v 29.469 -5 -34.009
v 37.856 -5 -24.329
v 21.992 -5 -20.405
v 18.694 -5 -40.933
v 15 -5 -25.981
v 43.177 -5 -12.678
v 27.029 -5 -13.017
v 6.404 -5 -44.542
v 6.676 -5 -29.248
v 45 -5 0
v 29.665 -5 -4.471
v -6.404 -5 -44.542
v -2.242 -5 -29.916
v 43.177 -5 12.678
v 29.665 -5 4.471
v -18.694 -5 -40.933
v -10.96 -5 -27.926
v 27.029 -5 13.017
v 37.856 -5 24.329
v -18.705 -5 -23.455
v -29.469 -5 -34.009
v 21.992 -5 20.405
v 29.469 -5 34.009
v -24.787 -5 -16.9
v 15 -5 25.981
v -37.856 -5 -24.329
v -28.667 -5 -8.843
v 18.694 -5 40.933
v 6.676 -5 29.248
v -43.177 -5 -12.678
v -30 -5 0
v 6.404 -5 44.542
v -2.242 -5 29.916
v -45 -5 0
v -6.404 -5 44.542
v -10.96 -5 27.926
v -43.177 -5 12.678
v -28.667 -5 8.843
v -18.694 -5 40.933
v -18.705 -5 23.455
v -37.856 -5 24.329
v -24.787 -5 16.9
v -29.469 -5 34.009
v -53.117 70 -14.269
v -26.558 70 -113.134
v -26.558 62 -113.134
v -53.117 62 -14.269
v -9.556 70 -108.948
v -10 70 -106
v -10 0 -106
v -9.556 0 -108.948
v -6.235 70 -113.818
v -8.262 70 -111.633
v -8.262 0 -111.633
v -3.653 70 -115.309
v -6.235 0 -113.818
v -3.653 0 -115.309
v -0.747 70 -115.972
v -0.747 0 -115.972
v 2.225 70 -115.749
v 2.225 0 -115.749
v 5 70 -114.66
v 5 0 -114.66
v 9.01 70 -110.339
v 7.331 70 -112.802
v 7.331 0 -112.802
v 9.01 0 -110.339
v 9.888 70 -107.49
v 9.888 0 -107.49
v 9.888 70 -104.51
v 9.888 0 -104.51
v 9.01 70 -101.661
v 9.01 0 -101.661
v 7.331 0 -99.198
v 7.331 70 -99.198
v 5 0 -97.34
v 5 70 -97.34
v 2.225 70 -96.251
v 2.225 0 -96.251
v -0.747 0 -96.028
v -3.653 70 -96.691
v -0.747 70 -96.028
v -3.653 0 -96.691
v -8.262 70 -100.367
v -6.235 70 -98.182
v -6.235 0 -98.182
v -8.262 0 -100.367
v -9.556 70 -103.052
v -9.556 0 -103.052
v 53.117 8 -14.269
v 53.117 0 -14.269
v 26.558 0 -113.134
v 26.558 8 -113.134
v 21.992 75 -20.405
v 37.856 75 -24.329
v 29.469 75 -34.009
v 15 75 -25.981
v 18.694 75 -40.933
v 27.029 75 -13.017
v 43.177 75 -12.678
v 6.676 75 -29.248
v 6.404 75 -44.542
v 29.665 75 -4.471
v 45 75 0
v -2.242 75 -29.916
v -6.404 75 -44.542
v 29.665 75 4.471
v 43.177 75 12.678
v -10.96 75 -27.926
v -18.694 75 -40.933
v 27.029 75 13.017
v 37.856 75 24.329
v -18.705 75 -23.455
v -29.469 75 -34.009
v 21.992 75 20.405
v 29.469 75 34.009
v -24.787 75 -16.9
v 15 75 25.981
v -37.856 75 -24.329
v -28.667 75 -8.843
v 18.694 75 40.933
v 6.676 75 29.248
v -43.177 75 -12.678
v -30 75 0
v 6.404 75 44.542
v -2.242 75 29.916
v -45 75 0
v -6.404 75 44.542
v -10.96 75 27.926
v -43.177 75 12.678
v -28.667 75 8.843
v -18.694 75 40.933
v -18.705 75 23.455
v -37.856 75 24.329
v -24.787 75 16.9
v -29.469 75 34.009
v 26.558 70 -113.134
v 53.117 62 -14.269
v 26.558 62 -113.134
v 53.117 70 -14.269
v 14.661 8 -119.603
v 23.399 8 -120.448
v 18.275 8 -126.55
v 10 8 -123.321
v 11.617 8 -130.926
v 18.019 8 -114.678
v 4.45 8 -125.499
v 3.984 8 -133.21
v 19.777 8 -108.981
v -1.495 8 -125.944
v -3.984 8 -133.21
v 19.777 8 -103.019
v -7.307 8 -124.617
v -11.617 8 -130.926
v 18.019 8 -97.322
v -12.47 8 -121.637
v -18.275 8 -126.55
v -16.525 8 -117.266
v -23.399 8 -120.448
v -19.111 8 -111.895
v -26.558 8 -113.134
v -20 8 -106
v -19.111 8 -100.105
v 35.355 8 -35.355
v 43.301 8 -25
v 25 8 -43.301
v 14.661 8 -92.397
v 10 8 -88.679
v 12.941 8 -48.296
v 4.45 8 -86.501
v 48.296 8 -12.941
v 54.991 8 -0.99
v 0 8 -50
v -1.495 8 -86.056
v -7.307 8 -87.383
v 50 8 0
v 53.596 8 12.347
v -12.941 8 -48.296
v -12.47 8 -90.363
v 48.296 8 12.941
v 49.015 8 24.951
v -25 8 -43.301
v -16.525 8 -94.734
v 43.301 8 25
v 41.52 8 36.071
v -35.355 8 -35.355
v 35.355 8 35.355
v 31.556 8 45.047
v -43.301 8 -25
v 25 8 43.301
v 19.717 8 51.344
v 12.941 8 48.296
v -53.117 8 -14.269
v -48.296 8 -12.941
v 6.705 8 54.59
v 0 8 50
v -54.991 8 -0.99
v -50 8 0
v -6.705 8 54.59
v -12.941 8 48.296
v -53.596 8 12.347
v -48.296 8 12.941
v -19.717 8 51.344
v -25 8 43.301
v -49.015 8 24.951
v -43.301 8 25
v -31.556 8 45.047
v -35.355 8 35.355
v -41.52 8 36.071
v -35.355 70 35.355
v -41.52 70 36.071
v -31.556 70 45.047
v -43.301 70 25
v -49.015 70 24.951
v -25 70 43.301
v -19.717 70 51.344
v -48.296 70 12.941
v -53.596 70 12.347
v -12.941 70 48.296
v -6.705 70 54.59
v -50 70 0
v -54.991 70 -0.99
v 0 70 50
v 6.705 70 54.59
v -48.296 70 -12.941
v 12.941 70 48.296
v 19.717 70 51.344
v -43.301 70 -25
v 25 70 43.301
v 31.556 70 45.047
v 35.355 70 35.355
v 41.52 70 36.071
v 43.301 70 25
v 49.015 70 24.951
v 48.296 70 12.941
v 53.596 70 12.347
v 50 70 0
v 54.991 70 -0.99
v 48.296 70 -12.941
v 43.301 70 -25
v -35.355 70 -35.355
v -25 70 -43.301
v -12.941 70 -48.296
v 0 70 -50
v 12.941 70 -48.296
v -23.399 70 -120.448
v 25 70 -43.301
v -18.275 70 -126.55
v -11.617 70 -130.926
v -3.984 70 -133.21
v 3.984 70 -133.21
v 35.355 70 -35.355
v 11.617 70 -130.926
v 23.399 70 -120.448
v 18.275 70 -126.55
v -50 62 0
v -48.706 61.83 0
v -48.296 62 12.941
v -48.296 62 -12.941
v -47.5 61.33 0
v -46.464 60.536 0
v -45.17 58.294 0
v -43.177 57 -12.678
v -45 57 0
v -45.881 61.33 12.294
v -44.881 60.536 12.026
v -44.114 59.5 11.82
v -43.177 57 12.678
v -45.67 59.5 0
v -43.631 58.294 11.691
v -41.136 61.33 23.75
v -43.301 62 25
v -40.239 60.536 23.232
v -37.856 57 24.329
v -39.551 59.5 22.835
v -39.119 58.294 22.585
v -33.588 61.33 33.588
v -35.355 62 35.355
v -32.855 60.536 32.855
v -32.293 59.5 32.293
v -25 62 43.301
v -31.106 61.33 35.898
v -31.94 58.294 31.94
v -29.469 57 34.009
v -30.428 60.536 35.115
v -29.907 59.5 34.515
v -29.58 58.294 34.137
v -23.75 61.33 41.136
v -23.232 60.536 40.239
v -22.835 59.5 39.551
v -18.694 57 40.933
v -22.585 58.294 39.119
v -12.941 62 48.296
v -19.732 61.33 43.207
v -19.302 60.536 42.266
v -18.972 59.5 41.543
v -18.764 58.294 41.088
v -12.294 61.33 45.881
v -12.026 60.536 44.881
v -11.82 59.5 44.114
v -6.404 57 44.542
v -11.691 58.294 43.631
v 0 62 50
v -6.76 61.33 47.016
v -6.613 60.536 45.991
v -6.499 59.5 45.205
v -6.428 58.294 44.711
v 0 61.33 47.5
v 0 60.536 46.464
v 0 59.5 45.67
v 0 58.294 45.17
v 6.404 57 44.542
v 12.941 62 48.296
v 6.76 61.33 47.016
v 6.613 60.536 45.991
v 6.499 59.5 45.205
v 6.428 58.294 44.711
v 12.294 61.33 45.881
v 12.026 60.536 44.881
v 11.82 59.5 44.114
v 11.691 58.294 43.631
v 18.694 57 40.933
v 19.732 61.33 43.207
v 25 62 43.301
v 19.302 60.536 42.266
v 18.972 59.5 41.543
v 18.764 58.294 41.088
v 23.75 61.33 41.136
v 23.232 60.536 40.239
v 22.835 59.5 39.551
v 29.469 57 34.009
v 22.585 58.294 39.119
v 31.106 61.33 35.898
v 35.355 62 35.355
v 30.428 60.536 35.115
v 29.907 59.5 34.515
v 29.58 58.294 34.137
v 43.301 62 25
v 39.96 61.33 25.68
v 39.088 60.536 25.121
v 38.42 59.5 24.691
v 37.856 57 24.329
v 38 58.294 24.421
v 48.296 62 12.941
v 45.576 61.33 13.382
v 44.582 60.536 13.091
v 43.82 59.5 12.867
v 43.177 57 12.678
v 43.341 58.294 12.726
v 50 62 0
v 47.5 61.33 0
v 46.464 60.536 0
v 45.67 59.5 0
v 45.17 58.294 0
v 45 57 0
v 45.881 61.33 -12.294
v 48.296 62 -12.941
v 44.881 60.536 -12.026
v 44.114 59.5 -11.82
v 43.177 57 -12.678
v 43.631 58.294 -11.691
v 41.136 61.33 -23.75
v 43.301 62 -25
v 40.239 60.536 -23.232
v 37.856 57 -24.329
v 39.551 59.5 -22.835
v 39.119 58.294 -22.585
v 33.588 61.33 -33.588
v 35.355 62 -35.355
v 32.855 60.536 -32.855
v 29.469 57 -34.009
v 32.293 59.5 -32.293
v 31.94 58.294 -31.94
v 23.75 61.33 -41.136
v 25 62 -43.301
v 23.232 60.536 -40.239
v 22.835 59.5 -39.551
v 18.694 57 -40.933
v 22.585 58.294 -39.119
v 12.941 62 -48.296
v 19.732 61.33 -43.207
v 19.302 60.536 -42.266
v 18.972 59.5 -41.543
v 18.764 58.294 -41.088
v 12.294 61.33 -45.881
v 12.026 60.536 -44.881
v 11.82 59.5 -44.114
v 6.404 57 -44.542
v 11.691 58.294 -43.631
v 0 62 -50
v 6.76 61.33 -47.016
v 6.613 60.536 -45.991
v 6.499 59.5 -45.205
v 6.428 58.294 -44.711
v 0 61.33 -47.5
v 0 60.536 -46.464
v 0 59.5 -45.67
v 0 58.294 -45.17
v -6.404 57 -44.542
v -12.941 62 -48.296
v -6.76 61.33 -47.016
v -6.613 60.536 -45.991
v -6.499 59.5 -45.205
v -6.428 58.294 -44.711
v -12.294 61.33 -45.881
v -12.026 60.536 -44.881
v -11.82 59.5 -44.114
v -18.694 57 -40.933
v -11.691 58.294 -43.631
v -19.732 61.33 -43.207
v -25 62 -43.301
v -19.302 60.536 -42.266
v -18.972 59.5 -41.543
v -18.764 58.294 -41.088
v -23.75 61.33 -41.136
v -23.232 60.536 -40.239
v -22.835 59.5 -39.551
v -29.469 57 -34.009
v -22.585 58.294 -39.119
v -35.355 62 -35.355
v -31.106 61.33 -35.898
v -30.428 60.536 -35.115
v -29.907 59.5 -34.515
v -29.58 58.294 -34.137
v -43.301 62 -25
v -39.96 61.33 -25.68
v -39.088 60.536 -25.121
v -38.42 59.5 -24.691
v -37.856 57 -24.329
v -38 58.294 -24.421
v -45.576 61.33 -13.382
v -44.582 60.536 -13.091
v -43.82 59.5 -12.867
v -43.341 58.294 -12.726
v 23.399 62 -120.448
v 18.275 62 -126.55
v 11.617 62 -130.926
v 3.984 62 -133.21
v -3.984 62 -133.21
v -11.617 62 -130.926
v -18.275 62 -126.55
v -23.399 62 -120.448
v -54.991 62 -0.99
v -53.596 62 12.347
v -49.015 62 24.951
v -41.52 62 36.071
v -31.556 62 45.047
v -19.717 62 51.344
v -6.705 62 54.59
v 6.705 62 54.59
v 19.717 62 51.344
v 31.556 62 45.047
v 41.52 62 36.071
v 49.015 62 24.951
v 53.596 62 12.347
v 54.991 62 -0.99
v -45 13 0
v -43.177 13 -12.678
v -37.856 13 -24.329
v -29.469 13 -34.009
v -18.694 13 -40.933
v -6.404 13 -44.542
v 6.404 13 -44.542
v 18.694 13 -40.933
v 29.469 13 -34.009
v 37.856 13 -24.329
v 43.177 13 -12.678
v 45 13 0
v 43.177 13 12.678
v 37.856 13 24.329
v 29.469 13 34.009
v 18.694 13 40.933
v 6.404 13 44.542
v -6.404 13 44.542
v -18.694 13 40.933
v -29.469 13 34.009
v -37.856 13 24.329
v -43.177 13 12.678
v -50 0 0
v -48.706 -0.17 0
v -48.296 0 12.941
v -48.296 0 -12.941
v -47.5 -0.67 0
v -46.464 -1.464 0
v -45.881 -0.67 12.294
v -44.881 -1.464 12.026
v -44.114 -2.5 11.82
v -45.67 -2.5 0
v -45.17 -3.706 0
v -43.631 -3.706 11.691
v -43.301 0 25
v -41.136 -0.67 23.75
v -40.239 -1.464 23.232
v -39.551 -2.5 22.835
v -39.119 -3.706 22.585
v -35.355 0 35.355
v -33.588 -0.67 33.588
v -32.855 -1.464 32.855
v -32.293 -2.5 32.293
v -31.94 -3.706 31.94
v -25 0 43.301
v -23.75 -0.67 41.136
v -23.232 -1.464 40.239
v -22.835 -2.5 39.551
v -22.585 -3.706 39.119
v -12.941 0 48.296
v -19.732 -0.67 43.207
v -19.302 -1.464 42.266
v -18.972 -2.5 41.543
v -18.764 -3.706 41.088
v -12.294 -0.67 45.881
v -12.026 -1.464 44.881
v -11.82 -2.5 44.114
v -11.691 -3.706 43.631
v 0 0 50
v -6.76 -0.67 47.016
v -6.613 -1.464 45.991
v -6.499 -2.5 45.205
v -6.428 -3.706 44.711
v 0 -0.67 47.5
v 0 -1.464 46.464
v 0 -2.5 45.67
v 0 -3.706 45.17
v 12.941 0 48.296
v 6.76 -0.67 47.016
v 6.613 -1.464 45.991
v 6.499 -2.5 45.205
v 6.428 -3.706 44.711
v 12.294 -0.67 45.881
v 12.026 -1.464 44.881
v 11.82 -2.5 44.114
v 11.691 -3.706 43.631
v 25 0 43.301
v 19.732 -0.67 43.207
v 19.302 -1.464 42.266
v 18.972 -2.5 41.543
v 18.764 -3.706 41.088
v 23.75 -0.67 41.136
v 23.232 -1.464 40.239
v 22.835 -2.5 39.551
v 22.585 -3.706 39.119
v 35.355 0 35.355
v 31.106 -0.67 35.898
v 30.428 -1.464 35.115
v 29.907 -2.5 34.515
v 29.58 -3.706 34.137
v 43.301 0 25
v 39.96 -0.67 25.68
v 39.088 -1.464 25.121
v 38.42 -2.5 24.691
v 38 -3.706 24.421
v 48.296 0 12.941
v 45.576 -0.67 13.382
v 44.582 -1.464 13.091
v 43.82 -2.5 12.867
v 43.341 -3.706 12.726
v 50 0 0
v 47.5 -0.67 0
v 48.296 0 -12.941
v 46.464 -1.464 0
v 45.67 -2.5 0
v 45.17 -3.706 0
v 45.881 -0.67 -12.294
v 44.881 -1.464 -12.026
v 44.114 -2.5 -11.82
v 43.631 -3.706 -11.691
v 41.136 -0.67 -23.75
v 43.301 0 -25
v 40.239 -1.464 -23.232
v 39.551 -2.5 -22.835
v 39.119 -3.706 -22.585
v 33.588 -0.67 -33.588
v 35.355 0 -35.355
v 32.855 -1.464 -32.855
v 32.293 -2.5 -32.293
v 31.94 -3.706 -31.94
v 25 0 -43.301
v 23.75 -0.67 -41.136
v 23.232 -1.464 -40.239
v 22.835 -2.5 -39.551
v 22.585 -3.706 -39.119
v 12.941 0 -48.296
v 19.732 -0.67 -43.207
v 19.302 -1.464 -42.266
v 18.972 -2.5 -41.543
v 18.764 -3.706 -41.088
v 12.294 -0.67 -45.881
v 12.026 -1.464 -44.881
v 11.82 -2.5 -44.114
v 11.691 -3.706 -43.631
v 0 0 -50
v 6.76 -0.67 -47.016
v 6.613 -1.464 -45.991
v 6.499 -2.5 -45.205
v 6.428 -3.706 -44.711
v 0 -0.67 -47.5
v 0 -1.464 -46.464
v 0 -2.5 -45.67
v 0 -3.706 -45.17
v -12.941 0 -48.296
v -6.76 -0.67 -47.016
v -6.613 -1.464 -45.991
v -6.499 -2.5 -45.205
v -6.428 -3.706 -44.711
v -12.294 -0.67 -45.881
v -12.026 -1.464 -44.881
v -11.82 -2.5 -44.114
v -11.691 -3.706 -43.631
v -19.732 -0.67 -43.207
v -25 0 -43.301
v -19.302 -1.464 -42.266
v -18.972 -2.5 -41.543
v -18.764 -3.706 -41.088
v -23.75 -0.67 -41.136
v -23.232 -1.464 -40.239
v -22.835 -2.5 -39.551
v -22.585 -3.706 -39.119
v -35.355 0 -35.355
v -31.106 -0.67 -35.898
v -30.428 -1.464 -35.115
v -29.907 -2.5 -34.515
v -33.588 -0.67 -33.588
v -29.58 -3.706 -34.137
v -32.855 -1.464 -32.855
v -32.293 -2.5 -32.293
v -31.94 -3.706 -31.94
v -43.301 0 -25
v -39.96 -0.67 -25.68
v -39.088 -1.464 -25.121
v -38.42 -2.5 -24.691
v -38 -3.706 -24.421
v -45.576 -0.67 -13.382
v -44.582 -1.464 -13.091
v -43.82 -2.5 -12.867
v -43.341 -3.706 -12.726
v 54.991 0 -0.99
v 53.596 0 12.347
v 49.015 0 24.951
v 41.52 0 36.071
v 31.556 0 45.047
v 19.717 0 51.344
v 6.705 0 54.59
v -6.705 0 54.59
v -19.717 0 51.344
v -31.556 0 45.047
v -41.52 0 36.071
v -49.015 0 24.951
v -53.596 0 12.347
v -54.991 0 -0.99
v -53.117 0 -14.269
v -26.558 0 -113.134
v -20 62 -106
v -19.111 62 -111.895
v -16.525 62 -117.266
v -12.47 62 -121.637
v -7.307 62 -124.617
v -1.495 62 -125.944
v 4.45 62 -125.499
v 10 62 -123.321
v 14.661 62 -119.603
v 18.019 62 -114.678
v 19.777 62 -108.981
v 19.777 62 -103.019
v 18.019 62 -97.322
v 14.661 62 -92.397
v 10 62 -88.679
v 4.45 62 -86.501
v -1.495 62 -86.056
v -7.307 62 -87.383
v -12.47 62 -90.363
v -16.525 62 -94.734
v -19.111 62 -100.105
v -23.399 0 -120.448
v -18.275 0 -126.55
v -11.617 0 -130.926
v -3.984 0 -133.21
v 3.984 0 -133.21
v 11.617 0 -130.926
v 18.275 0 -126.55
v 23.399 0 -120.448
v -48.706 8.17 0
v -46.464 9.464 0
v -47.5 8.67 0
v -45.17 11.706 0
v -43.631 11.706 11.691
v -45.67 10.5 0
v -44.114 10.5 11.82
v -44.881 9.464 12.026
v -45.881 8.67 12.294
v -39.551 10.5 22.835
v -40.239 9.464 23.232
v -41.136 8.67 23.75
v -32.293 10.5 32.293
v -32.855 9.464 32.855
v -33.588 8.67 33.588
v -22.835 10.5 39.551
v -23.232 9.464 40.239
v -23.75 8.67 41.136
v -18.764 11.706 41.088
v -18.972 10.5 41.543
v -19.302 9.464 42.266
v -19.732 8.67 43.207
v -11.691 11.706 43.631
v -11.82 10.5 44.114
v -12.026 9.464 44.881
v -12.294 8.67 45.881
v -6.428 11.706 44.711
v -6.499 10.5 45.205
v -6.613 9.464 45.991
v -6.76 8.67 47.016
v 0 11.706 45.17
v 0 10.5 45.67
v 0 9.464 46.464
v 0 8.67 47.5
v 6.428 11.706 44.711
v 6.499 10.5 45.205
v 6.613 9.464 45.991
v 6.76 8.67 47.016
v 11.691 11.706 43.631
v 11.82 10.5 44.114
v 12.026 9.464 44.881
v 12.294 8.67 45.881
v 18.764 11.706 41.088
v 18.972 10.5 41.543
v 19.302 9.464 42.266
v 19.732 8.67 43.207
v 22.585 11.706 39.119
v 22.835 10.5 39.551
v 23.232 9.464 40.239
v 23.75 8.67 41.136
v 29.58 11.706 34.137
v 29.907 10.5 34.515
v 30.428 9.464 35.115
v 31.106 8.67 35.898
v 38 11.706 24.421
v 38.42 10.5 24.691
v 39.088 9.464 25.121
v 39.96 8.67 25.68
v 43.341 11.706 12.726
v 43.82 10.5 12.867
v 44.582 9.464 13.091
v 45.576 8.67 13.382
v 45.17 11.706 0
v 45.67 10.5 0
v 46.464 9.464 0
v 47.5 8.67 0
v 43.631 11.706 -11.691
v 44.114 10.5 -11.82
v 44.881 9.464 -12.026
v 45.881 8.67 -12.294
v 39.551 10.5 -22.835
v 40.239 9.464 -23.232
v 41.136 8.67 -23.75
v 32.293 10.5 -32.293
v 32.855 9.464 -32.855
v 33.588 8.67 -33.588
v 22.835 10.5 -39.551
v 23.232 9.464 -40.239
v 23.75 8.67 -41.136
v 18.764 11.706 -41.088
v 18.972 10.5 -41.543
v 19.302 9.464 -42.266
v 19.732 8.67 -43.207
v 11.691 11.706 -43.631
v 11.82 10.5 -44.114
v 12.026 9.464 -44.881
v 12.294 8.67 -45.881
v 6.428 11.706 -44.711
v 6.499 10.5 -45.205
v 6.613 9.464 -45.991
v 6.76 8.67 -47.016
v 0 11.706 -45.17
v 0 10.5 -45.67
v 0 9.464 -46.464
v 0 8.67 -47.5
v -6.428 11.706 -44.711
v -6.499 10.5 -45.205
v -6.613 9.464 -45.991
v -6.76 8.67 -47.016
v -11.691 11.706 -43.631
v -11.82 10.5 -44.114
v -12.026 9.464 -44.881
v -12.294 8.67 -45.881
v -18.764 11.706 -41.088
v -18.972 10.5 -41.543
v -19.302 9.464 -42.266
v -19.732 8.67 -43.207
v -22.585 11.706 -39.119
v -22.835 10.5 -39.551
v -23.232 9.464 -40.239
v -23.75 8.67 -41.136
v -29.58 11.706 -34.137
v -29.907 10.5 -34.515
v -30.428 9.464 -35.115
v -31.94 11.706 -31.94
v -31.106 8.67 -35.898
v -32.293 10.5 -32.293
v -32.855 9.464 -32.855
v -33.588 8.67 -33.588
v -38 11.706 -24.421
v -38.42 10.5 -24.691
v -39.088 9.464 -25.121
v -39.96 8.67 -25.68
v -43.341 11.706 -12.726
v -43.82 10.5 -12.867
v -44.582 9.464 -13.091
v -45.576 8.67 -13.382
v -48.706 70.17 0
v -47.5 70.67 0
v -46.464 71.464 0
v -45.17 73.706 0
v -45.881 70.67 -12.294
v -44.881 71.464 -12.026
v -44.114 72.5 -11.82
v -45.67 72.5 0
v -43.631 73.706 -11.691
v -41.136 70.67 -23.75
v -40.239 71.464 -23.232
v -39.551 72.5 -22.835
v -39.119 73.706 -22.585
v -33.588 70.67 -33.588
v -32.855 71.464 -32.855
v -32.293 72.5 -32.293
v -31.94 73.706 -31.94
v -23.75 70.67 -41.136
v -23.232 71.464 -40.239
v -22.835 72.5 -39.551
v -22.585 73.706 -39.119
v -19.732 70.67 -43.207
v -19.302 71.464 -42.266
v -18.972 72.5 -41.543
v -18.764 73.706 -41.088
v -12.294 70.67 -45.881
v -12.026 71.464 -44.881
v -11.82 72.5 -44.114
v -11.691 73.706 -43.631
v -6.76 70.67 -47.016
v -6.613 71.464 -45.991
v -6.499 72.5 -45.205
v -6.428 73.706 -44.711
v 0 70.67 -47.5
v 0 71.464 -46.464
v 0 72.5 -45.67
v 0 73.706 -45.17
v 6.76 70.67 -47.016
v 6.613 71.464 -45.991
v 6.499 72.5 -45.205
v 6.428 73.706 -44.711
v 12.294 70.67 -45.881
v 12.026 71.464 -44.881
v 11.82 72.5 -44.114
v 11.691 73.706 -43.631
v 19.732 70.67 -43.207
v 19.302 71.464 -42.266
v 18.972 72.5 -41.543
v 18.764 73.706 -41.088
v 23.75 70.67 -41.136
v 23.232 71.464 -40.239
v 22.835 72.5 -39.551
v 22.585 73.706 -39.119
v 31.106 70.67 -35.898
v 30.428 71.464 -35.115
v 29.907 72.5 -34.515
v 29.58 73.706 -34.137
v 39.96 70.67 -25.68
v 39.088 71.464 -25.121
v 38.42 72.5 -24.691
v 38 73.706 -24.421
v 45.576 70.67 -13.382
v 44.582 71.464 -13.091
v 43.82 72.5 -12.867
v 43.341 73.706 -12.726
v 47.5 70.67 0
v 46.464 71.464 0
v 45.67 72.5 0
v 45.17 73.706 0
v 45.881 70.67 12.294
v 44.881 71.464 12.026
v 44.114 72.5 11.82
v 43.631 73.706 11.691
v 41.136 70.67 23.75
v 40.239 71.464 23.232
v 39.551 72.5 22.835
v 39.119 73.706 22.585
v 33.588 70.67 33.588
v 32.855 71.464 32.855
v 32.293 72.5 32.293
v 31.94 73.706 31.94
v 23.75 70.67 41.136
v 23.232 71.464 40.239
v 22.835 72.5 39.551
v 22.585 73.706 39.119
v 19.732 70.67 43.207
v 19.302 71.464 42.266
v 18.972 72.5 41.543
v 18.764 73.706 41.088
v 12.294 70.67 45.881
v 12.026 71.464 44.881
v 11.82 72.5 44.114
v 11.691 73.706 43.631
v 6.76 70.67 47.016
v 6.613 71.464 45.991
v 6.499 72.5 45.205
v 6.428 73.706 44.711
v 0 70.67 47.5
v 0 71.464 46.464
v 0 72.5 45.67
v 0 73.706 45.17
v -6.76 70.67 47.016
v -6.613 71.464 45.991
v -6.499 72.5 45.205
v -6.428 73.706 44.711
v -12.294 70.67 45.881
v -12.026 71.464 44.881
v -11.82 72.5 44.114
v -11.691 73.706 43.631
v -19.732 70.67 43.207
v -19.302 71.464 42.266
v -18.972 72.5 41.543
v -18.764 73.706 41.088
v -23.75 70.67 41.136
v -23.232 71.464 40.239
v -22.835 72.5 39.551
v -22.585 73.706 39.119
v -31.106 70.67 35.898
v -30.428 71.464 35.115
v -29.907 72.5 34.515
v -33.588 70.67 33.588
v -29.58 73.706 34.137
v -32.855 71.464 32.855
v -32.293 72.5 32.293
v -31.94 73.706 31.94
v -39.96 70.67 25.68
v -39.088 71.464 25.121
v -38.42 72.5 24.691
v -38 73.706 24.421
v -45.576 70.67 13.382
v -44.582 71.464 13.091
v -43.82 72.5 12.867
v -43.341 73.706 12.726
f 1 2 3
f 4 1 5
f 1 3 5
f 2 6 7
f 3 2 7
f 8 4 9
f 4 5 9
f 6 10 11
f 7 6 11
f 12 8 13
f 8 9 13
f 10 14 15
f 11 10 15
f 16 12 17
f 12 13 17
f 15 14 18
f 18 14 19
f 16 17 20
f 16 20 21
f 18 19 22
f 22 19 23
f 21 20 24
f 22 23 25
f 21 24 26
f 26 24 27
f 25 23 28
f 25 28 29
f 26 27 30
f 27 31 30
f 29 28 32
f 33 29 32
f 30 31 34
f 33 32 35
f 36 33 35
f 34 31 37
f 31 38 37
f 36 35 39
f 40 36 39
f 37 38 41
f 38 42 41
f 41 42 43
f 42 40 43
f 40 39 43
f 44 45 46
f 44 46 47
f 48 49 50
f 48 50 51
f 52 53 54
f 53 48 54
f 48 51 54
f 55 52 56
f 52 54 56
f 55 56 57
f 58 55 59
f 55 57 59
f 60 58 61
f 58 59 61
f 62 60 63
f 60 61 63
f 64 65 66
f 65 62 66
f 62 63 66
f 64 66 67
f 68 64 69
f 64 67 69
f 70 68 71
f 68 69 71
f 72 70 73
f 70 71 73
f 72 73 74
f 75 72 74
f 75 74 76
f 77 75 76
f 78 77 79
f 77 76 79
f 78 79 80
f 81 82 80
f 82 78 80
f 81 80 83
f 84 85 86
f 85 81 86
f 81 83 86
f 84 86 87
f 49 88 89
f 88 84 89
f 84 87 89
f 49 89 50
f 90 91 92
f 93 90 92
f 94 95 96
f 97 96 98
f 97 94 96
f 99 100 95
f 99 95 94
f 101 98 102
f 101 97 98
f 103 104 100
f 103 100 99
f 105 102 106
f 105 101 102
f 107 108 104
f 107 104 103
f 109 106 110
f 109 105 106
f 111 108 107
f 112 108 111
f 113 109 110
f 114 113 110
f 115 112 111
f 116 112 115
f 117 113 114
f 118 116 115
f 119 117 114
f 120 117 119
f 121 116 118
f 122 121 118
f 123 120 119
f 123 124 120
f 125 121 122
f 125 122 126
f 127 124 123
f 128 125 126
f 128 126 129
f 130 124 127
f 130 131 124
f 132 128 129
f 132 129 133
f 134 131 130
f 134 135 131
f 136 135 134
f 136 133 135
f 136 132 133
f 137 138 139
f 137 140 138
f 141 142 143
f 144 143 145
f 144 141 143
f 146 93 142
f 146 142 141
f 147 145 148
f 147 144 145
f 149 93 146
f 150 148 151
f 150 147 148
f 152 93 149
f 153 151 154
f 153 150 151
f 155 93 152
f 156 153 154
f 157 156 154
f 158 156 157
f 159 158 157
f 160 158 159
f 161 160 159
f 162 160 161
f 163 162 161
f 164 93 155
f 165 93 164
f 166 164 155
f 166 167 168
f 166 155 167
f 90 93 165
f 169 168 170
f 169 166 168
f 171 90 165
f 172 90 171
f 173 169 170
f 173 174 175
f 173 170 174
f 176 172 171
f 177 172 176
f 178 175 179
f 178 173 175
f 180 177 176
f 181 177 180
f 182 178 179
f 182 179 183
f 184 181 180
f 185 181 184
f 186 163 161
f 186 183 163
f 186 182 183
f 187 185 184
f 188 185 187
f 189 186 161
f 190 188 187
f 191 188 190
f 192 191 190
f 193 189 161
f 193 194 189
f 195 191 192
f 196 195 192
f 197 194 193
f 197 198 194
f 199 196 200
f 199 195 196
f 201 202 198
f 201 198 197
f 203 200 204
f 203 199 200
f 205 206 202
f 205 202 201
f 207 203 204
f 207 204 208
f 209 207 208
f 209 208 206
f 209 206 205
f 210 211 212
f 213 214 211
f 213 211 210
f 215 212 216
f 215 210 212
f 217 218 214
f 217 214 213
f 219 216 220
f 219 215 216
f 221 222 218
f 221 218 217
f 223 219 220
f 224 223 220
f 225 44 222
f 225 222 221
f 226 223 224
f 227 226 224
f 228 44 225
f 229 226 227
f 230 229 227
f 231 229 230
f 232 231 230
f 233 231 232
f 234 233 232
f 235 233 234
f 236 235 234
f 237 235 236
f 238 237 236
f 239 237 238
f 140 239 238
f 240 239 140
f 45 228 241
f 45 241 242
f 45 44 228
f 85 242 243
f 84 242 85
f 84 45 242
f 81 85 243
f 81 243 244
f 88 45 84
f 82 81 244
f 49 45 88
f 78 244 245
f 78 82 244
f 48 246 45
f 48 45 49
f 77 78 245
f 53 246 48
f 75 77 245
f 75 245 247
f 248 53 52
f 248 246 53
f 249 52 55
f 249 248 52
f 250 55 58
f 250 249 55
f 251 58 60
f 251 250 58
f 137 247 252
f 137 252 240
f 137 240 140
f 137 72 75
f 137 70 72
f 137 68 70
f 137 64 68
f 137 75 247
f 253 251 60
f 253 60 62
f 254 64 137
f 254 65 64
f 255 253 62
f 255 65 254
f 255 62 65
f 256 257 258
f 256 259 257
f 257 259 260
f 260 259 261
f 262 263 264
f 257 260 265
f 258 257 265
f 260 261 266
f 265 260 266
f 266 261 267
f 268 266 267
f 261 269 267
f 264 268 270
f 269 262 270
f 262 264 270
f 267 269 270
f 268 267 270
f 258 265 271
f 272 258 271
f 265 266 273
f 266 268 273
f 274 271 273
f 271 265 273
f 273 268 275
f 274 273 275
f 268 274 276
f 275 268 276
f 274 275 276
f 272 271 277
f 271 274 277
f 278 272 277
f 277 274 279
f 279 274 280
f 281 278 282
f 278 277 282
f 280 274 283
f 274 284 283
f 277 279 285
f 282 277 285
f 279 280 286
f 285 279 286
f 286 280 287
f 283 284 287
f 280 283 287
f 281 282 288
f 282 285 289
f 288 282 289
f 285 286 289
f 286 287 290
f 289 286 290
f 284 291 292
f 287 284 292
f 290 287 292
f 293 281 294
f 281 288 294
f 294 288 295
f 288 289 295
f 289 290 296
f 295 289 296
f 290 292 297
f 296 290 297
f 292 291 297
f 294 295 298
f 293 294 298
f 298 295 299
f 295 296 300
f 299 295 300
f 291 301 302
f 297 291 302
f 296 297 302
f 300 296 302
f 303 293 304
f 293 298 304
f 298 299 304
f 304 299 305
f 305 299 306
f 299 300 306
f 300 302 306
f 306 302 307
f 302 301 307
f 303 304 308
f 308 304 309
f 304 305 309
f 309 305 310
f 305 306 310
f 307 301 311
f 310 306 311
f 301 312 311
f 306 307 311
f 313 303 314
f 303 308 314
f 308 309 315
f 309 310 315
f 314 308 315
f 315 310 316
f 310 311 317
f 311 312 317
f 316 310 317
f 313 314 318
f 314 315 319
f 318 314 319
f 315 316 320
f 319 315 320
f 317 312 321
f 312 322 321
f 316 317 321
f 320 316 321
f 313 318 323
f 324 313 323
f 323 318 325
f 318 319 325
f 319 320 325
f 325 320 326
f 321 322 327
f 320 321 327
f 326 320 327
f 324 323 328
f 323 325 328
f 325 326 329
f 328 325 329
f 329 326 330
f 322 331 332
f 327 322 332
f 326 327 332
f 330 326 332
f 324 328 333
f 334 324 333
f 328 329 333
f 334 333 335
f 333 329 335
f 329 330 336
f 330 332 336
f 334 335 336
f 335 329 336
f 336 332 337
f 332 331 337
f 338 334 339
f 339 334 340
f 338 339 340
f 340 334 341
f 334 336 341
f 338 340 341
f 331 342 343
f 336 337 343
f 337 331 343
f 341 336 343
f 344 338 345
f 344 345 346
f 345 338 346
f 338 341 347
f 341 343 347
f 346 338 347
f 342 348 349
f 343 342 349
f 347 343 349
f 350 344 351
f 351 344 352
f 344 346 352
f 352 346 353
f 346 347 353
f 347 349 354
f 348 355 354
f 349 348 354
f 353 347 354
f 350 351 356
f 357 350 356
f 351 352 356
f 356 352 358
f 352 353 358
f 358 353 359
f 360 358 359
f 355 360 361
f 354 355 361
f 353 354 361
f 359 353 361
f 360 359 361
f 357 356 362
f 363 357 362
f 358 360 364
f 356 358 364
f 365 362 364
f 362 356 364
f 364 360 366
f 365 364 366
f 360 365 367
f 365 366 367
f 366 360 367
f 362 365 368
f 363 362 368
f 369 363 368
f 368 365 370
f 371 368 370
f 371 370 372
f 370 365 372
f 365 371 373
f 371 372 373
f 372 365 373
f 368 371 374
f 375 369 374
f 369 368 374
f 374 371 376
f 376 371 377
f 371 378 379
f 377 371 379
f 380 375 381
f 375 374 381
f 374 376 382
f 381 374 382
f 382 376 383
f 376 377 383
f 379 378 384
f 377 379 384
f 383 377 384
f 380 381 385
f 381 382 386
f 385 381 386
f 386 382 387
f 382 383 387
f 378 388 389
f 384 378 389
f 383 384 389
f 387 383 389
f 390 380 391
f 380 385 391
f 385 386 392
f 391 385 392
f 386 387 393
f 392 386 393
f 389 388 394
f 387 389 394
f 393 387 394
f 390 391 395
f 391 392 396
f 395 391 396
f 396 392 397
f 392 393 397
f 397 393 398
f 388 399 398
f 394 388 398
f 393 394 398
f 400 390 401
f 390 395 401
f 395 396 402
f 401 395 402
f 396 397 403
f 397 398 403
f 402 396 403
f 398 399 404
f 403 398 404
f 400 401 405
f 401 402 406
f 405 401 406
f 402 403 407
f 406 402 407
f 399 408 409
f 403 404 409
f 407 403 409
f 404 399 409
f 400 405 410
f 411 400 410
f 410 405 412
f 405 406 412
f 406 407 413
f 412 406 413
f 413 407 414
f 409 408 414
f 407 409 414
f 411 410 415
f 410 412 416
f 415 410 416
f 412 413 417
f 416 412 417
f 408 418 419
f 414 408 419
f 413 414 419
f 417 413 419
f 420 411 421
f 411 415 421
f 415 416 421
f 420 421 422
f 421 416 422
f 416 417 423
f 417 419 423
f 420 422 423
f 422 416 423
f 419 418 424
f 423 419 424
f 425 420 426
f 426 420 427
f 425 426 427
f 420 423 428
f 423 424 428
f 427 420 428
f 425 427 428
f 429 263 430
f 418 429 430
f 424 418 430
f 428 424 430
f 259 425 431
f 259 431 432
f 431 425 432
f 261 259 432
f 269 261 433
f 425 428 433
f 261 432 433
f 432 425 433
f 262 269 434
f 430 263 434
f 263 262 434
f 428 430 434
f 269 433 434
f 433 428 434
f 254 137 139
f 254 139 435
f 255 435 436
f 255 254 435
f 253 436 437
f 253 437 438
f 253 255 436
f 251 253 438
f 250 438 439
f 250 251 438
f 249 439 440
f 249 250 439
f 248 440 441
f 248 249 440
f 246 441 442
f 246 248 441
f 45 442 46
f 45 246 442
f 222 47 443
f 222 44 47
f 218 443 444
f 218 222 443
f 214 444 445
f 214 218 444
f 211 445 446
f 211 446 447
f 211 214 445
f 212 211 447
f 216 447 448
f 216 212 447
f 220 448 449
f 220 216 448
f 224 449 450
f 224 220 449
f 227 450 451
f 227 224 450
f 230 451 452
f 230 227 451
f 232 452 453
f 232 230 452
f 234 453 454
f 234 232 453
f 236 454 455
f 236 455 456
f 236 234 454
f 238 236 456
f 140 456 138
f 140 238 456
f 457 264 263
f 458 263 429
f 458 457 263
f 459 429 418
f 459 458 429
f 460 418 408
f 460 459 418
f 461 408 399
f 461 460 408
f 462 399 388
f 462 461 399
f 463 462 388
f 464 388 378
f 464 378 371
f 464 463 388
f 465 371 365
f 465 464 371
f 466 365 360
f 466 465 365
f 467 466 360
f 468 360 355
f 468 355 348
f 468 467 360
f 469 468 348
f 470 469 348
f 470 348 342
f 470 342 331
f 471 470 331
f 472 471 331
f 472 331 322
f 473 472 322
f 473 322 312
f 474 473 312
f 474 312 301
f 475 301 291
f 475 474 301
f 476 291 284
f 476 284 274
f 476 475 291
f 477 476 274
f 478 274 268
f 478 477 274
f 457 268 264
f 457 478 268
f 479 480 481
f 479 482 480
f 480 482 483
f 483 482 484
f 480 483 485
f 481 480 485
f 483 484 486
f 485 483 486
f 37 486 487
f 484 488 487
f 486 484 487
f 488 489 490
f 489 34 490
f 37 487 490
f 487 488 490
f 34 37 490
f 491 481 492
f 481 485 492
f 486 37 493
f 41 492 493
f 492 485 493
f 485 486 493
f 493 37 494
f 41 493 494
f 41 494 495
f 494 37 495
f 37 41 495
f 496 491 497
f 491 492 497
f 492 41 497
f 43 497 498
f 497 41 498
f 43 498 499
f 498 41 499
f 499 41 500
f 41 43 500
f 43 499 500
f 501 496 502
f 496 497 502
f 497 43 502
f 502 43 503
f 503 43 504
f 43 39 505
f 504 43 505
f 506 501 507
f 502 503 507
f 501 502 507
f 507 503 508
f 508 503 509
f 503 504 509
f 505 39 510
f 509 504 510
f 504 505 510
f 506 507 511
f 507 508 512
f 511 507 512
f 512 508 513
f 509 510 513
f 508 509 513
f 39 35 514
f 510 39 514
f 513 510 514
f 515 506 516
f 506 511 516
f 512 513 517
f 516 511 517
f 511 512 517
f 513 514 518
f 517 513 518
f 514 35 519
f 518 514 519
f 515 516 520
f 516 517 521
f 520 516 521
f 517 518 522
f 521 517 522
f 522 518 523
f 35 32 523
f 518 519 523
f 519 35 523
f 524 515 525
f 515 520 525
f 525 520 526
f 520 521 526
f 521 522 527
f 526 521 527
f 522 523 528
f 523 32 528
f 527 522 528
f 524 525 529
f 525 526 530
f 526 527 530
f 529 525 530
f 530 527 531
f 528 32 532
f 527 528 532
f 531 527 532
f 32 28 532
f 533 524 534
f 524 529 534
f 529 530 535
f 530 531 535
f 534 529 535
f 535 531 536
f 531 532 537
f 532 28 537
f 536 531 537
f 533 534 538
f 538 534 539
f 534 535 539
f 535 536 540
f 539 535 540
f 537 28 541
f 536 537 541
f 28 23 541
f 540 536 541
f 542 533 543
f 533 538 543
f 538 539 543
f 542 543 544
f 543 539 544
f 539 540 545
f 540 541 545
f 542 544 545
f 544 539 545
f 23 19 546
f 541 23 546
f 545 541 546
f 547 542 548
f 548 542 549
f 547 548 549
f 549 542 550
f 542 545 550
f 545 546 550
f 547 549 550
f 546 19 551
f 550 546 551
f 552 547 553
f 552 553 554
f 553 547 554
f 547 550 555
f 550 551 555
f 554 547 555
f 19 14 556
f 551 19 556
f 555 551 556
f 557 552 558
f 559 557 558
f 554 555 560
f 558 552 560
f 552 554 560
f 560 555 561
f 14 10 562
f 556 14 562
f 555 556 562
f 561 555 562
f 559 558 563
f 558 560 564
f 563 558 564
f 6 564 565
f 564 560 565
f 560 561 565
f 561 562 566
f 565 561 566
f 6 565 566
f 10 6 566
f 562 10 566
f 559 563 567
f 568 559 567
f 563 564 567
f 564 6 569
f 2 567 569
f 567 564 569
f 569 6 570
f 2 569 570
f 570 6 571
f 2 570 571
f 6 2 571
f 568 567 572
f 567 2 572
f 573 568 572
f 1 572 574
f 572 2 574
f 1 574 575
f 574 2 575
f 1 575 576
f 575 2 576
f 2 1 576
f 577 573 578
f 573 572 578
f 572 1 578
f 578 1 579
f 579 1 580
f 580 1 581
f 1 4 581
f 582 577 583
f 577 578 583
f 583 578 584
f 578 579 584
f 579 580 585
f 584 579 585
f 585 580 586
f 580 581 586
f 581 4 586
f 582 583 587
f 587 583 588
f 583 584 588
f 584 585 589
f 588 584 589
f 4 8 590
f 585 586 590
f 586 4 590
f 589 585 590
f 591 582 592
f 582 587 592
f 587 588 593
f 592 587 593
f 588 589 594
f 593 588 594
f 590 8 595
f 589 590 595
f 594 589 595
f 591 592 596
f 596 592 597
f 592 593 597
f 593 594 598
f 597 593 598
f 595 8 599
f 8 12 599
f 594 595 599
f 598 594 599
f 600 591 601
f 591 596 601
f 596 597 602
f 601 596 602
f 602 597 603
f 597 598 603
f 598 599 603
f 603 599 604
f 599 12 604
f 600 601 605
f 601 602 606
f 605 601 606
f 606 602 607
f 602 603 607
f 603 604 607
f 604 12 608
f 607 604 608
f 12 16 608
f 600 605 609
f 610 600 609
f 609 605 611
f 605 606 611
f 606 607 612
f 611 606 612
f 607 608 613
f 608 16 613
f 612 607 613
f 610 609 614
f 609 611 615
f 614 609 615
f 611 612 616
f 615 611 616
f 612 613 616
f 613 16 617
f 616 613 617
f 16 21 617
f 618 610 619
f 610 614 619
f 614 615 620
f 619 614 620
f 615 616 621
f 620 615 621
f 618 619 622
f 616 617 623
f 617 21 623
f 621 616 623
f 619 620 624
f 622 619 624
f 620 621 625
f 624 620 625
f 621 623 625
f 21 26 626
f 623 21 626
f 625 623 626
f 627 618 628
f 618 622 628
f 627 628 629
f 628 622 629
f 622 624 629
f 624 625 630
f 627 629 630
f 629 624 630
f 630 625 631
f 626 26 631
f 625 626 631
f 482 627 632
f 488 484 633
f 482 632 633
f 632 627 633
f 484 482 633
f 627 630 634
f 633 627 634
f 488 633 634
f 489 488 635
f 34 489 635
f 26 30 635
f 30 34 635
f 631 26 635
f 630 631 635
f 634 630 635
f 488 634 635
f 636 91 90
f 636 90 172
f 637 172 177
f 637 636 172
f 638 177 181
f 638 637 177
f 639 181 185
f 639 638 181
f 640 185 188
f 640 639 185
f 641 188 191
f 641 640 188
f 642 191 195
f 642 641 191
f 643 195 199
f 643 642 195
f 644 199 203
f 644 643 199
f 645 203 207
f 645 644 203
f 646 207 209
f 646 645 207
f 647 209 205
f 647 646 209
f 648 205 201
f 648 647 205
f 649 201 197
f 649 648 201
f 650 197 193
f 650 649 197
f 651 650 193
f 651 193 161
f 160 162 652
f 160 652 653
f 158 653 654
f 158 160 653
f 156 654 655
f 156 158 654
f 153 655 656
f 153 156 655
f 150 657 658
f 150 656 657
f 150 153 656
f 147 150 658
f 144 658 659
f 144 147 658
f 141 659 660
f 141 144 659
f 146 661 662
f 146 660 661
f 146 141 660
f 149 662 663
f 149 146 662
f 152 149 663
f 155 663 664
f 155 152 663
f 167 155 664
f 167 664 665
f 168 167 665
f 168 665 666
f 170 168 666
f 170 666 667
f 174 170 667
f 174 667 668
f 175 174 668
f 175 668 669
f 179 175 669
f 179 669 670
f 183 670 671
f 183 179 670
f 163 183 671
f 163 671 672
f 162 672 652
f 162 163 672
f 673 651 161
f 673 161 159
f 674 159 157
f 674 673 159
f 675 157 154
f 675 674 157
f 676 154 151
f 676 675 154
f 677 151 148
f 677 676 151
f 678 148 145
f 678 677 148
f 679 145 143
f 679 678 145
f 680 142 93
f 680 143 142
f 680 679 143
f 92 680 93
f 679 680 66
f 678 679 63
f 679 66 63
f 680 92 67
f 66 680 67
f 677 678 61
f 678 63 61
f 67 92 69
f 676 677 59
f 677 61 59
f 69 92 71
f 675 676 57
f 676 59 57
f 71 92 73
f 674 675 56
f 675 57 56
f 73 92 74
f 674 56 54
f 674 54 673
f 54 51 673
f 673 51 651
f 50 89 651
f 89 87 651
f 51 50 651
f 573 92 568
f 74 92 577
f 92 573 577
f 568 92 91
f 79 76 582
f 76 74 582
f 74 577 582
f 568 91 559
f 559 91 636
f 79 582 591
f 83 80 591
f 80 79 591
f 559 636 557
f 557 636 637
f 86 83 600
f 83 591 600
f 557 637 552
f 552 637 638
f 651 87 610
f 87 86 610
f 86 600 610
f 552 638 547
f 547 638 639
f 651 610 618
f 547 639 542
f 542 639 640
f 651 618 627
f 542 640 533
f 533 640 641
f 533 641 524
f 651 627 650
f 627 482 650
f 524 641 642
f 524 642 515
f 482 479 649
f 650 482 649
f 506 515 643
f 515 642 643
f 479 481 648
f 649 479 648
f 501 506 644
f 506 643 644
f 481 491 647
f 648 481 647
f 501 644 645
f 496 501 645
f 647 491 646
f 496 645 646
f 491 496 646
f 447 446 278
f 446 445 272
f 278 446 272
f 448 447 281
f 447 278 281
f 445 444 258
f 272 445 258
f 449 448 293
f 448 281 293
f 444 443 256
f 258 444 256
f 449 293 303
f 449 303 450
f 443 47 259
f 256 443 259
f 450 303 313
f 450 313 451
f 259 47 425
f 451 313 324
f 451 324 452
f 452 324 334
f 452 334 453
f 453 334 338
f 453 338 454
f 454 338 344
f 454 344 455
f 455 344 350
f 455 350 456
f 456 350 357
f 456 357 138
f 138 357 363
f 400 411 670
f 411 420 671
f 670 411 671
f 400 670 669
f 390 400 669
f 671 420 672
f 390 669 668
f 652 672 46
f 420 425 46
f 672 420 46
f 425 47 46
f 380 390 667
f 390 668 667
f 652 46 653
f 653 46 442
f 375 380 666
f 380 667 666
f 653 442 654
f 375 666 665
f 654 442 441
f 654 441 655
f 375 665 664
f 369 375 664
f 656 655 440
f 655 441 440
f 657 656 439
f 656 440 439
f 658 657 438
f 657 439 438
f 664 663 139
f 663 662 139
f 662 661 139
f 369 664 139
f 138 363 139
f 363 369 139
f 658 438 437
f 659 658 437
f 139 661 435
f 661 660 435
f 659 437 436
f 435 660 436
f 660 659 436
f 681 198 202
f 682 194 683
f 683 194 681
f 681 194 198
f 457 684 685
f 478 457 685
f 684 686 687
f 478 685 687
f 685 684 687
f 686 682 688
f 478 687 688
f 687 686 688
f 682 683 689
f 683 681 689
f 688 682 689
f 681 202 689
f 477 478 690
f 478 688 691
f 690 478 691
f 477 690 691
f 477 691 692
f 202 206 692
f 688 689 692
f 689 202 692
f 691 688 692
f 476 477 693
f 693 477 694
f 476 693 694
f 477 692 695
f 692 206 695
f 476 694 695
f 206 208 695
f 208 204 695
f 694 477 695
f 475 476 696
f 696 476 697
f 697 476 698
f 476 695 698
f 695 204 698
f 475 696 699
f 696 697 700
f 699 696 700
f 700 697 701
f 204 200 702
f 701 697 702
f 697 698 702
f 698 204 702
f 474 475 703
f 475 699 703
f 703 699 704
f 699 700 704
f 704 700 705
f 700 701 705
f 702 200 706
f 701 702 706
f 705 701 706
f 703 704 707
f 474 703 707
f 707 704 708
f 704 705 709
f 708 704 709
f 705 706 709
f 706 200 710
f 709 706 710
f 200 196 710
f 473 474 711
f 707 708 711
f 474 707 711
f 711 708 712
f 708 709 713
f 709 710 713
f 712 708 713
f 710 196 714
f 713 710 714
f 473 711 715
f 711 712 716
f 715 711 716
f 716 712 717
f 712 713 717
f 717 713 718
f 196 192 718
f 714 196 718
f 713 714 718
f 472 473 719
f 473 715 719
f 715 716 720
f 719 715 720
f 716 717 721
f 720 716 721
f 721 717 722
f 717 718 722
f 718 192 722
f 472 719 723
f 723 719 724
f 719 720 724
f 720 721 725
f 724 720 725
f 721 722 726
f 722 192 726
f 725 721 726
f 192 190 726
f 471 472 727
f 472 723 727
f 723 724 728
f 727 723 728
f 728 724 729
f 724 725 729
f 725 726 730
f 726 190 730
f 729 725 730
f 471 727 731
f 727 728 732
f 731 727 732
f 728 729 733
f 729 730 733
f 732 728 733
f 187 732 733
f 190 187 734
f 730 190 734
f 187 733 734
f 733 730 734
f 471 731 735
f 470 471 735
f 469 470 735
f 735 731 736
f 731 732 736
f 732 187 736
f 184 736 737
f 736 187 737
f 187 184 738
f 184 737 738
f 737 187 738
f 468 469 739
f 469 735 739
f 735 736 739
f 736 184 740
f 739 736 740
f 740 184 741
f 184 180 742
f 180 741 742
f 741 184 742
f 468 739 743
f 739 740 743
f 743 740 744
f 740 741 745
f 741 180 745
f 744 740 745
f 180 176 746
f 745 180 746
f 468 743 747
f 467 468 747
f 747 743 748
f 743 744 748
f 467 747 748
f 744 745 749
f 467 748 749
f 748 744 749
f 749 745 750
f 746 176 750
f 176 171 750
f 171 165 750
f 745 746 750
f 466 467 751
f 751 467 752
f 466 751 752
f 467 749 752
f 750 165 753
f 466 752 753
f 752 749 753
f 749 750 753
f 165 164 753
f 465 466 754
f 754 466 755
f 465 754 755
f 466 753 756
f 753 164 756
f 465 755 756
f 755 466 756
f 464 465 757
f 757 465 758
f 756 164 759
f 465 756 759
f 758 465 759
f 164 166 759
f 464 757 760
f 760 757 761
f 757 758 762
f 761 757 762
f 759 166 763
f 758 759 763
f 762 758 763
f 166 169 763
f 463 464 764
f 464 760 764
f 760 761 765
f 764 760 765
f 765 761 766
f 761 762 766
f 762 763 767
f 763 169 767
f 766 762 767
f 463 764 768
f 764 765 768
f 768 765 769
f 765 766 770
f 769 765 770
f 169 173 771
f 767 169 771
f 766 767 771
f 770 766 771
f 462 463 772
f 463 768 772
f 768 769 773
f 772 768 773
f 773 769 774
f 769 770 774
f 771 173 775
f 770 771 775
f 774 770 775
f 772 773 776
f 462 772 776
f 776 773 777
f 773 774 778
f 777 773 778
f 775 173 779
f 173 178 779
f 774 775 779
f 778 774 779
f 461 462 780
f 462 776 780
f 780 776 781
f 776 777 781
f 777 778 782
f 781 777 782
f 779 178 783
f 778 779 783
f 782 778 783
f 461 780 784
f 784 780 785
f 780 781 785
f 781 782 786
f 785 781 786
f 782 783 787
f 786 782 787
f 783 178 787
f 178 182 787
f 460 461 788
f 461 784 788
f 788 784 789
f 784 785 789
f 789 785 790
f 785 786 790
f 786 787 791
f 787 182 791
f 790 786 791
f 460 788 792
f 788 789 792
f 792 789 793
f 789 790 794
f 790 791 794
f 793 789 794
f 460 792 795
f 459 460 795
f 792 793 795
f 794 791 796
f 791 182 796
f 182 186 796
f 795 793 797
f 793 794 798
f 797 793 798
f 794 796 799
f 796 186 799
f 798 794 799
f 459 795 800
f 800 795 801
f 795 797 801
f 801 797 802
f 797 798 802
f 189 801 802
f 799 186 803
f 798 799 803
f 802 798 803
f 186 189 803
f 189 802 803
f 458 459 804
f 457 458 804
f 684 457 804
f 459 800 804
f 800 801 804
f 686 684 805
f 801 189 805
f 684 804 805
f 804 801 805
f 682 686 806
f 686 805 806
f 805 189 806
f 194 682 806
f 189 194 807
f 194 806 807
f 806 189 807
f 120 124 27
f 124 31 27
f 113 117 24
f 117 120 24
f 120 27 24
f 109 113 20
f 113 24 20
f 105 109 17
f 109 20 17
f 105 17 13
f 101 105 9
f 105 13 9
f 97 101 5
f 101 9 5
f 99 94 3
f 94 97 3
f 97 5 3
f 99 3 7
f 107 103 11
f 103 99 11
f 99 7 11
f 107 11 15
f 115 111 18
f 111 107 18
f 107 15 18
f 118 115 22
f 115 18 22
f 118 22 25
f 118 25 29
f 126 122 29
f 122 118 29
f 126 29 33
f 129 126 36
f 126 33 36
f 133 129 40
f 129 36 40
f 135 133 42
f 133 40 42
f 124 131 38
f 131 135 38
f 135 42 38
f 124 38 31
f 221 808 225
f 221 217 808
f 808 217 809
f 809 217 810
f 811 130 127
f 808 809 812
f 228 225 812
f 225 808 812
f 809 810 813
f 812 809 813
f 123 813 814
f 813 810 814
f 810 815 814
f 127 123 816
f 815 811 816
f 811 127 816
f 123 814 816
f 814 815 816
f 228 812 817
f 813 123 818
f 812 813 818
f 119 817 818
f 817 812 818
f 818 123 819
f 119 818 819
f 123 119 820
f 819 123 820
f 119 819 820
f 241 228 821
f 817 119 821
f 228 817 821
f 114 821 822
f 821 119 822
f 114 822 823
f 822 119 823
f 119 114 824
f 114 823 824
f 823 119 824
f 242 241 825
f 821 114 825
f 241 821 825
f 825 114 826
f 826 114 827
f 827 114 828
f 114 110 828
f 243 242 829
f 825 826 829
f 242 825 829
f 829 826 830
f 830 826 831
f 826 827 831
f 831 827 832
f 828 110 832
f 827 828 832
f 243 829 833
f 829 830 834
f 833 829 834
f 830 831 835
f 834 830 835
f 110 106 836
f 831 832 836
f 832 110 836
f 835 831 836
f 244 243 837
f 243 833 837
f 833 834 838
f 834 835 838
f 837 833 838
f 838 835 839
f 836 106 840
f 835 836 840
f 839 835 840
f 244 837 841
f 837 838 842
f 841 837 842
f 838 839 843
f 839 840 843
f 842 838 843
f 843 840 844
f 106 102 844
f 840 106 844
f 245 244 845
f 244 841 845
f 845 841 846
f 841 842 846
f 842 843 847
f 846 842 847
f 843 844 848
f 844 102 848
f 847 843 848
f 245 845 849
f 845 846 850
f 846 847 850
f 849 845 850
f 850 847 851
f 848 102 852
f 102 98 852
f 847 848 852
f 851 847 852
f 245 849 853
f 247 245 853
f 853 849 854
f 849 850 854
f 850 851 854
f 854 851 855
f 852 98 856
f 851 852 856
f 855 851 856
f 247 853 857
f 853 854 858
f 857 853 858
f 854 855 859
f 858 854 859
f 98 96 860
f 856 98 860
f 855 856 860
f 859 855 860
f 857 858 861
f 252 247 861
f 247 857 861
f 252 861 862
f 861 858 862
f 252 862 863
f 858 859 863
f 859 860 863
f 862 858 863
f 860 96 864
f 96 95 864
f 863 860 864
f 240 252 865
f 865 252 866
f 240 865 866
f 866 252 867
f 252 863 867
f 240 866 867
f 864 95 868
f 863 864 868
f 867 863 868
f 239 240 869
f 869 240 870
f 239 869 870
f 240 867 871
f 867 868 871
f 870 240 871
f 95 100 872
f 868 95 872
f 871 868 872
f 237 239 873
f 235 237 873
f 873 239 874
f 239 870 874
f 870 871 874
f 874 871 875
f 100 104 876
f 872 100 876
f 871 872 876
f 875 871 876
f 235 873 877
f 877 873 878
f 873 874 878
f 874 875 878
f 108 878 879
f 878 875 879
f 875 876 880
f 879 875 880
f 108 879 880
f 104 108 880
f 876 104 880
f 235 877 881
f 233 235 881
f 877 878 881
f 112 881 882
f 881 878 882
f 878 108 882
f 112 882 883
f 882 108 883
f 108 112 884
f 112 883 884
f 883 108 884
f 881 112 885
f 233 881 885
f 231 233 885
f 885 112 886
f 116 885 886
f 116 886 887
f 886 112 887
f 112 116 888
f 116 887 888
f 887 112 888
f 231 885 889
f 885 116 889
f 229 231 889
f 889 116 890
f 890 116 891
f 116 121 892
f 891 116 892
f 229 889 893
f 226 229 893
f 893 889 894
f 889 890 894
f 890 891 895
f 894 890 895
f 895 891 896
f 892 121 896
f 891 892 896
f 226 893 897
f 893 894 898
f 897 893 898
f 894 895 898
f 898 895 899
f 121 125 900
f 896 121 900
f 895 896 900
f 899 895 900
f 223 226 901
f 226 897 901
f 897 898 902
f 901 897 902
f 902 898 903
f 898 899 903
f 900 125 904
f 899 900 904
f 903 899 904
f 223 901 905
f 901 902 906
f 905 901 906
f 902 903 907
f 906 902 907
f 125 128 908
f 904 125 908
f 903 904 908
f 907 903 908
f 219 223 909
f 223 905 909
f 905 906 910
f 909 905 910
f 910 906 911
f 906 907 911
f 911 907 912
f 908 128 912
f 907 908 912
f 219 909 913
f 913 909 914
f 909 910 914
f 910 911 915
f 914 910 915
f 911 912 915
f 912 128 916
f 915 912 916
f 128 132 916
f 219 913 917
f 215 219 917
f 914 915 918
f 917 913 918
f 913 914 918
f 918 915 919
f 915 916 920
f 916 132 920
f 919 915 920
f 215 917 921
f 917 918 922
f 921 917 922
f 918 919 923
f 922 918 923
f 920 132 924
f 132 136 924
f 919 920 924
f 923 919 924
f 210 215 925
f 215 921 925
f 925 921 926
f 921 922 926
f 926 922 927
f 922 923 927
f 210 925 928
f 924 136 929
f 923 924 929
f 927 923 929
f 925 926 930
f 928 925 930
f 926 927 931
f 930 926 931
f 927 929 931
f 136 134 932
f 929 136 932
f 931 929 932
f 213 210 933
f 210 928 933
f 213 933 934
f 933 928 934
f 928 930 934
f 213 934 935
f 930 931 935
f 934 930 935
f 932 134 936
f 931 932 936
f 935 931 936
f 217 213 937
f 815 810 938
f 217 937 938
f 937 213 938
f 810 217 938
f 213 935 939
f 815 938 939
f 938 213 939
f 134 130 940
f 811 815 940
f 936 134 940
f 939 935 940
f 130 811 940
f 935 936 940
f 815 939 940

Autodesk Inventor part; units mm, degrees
ref_plane "YZ Plane" through (0, 0, 0) normal (1, 0, 0) x (0, 1, 0)
ref_plane "XZ Plane" through (0, 0, 0) normal (0, 1, 0) x (-1, 0, 0)
ref_plane "XY Plane" through (0, 0, 0) normal (0, 0, 1) x (1, 0, 0)
sketch "草图1" plane through (0, 0, 0) normal (0, 1, 0) x (-1, 0, 0)
  circle A0 centre (0, 0) radius 30
  circle A1 centre (0, 0) radius 45
  circle A2 centre (0, -106) radius 10
  circle A3 centre (0, 0) radius 55
  arc A4 (-26.5584, -113.1344) -> (26.5584, -113.1344) centre (0, -106) ccw
  line L0 (53.1168, -14.2689) -> (26.5584, -113.1344)
  line L1 (-53.1168, -14.2689) -> (-26.5584, -113.1344)
  circle A5 centre (0, -106) radius 20
  dimension "d0" = 60
  dimension "d1" = 90
  dimension "d3" = 20
  dimension "d4" = 110
  dimension "d5" = 55
  dimension "d8" = 40
extrude "拉伸2" add sketch "草图1" along normal blind 70 contours A5
extrude "拉伸3" add sketch "草图1" along normal blind 75 and the other way blind 5 contours A1
extrude "拉伸4" add sketch "草图1" along normal blind 8 contours A3 | A3 L0 A4 L1
sketch "草图2" plane through (0, 70, -106) normal (0, 1, 0) x (1, 0, 0)
  circle A0 centre (0, 0) radius 20 projected
  circle A1 centre (0, 0) radius 10 projected
  arc A2 (26.5584, 7.1344) -> (-26.5584, 7.1344) centre (0, 0) ccw
  arc A3 (-53.1168, -91.7311) -> (53.1168, -91.7311) centre (0, -106) ccw
  line L0 (53.1168, -91.7311) -> (26.5584, 7.1344) projected
  line L1 (26.5584, 7.1344) -> (53.1168, -91.7311)
  line L2 (-26.5584, 7.1344) -> (-53.1168, -91.7311) projected
  line L3 (-26.5584, 7.1344) -> (-53.1168, -91.7311)
  circle A4 centre (0, -106) radius 30
  circle A5 centre (0, 0) radius 10
  dimension "d19" = 60
extrude "拉伸5" add sketch "草图2" against normal blind 8 contours L0 A3 L2 A2
fillet "圆角1" radius 5 4 edges at (45, 70, 0) (45, 0, 0) (45, 62, 0) (45, 8, 0)
